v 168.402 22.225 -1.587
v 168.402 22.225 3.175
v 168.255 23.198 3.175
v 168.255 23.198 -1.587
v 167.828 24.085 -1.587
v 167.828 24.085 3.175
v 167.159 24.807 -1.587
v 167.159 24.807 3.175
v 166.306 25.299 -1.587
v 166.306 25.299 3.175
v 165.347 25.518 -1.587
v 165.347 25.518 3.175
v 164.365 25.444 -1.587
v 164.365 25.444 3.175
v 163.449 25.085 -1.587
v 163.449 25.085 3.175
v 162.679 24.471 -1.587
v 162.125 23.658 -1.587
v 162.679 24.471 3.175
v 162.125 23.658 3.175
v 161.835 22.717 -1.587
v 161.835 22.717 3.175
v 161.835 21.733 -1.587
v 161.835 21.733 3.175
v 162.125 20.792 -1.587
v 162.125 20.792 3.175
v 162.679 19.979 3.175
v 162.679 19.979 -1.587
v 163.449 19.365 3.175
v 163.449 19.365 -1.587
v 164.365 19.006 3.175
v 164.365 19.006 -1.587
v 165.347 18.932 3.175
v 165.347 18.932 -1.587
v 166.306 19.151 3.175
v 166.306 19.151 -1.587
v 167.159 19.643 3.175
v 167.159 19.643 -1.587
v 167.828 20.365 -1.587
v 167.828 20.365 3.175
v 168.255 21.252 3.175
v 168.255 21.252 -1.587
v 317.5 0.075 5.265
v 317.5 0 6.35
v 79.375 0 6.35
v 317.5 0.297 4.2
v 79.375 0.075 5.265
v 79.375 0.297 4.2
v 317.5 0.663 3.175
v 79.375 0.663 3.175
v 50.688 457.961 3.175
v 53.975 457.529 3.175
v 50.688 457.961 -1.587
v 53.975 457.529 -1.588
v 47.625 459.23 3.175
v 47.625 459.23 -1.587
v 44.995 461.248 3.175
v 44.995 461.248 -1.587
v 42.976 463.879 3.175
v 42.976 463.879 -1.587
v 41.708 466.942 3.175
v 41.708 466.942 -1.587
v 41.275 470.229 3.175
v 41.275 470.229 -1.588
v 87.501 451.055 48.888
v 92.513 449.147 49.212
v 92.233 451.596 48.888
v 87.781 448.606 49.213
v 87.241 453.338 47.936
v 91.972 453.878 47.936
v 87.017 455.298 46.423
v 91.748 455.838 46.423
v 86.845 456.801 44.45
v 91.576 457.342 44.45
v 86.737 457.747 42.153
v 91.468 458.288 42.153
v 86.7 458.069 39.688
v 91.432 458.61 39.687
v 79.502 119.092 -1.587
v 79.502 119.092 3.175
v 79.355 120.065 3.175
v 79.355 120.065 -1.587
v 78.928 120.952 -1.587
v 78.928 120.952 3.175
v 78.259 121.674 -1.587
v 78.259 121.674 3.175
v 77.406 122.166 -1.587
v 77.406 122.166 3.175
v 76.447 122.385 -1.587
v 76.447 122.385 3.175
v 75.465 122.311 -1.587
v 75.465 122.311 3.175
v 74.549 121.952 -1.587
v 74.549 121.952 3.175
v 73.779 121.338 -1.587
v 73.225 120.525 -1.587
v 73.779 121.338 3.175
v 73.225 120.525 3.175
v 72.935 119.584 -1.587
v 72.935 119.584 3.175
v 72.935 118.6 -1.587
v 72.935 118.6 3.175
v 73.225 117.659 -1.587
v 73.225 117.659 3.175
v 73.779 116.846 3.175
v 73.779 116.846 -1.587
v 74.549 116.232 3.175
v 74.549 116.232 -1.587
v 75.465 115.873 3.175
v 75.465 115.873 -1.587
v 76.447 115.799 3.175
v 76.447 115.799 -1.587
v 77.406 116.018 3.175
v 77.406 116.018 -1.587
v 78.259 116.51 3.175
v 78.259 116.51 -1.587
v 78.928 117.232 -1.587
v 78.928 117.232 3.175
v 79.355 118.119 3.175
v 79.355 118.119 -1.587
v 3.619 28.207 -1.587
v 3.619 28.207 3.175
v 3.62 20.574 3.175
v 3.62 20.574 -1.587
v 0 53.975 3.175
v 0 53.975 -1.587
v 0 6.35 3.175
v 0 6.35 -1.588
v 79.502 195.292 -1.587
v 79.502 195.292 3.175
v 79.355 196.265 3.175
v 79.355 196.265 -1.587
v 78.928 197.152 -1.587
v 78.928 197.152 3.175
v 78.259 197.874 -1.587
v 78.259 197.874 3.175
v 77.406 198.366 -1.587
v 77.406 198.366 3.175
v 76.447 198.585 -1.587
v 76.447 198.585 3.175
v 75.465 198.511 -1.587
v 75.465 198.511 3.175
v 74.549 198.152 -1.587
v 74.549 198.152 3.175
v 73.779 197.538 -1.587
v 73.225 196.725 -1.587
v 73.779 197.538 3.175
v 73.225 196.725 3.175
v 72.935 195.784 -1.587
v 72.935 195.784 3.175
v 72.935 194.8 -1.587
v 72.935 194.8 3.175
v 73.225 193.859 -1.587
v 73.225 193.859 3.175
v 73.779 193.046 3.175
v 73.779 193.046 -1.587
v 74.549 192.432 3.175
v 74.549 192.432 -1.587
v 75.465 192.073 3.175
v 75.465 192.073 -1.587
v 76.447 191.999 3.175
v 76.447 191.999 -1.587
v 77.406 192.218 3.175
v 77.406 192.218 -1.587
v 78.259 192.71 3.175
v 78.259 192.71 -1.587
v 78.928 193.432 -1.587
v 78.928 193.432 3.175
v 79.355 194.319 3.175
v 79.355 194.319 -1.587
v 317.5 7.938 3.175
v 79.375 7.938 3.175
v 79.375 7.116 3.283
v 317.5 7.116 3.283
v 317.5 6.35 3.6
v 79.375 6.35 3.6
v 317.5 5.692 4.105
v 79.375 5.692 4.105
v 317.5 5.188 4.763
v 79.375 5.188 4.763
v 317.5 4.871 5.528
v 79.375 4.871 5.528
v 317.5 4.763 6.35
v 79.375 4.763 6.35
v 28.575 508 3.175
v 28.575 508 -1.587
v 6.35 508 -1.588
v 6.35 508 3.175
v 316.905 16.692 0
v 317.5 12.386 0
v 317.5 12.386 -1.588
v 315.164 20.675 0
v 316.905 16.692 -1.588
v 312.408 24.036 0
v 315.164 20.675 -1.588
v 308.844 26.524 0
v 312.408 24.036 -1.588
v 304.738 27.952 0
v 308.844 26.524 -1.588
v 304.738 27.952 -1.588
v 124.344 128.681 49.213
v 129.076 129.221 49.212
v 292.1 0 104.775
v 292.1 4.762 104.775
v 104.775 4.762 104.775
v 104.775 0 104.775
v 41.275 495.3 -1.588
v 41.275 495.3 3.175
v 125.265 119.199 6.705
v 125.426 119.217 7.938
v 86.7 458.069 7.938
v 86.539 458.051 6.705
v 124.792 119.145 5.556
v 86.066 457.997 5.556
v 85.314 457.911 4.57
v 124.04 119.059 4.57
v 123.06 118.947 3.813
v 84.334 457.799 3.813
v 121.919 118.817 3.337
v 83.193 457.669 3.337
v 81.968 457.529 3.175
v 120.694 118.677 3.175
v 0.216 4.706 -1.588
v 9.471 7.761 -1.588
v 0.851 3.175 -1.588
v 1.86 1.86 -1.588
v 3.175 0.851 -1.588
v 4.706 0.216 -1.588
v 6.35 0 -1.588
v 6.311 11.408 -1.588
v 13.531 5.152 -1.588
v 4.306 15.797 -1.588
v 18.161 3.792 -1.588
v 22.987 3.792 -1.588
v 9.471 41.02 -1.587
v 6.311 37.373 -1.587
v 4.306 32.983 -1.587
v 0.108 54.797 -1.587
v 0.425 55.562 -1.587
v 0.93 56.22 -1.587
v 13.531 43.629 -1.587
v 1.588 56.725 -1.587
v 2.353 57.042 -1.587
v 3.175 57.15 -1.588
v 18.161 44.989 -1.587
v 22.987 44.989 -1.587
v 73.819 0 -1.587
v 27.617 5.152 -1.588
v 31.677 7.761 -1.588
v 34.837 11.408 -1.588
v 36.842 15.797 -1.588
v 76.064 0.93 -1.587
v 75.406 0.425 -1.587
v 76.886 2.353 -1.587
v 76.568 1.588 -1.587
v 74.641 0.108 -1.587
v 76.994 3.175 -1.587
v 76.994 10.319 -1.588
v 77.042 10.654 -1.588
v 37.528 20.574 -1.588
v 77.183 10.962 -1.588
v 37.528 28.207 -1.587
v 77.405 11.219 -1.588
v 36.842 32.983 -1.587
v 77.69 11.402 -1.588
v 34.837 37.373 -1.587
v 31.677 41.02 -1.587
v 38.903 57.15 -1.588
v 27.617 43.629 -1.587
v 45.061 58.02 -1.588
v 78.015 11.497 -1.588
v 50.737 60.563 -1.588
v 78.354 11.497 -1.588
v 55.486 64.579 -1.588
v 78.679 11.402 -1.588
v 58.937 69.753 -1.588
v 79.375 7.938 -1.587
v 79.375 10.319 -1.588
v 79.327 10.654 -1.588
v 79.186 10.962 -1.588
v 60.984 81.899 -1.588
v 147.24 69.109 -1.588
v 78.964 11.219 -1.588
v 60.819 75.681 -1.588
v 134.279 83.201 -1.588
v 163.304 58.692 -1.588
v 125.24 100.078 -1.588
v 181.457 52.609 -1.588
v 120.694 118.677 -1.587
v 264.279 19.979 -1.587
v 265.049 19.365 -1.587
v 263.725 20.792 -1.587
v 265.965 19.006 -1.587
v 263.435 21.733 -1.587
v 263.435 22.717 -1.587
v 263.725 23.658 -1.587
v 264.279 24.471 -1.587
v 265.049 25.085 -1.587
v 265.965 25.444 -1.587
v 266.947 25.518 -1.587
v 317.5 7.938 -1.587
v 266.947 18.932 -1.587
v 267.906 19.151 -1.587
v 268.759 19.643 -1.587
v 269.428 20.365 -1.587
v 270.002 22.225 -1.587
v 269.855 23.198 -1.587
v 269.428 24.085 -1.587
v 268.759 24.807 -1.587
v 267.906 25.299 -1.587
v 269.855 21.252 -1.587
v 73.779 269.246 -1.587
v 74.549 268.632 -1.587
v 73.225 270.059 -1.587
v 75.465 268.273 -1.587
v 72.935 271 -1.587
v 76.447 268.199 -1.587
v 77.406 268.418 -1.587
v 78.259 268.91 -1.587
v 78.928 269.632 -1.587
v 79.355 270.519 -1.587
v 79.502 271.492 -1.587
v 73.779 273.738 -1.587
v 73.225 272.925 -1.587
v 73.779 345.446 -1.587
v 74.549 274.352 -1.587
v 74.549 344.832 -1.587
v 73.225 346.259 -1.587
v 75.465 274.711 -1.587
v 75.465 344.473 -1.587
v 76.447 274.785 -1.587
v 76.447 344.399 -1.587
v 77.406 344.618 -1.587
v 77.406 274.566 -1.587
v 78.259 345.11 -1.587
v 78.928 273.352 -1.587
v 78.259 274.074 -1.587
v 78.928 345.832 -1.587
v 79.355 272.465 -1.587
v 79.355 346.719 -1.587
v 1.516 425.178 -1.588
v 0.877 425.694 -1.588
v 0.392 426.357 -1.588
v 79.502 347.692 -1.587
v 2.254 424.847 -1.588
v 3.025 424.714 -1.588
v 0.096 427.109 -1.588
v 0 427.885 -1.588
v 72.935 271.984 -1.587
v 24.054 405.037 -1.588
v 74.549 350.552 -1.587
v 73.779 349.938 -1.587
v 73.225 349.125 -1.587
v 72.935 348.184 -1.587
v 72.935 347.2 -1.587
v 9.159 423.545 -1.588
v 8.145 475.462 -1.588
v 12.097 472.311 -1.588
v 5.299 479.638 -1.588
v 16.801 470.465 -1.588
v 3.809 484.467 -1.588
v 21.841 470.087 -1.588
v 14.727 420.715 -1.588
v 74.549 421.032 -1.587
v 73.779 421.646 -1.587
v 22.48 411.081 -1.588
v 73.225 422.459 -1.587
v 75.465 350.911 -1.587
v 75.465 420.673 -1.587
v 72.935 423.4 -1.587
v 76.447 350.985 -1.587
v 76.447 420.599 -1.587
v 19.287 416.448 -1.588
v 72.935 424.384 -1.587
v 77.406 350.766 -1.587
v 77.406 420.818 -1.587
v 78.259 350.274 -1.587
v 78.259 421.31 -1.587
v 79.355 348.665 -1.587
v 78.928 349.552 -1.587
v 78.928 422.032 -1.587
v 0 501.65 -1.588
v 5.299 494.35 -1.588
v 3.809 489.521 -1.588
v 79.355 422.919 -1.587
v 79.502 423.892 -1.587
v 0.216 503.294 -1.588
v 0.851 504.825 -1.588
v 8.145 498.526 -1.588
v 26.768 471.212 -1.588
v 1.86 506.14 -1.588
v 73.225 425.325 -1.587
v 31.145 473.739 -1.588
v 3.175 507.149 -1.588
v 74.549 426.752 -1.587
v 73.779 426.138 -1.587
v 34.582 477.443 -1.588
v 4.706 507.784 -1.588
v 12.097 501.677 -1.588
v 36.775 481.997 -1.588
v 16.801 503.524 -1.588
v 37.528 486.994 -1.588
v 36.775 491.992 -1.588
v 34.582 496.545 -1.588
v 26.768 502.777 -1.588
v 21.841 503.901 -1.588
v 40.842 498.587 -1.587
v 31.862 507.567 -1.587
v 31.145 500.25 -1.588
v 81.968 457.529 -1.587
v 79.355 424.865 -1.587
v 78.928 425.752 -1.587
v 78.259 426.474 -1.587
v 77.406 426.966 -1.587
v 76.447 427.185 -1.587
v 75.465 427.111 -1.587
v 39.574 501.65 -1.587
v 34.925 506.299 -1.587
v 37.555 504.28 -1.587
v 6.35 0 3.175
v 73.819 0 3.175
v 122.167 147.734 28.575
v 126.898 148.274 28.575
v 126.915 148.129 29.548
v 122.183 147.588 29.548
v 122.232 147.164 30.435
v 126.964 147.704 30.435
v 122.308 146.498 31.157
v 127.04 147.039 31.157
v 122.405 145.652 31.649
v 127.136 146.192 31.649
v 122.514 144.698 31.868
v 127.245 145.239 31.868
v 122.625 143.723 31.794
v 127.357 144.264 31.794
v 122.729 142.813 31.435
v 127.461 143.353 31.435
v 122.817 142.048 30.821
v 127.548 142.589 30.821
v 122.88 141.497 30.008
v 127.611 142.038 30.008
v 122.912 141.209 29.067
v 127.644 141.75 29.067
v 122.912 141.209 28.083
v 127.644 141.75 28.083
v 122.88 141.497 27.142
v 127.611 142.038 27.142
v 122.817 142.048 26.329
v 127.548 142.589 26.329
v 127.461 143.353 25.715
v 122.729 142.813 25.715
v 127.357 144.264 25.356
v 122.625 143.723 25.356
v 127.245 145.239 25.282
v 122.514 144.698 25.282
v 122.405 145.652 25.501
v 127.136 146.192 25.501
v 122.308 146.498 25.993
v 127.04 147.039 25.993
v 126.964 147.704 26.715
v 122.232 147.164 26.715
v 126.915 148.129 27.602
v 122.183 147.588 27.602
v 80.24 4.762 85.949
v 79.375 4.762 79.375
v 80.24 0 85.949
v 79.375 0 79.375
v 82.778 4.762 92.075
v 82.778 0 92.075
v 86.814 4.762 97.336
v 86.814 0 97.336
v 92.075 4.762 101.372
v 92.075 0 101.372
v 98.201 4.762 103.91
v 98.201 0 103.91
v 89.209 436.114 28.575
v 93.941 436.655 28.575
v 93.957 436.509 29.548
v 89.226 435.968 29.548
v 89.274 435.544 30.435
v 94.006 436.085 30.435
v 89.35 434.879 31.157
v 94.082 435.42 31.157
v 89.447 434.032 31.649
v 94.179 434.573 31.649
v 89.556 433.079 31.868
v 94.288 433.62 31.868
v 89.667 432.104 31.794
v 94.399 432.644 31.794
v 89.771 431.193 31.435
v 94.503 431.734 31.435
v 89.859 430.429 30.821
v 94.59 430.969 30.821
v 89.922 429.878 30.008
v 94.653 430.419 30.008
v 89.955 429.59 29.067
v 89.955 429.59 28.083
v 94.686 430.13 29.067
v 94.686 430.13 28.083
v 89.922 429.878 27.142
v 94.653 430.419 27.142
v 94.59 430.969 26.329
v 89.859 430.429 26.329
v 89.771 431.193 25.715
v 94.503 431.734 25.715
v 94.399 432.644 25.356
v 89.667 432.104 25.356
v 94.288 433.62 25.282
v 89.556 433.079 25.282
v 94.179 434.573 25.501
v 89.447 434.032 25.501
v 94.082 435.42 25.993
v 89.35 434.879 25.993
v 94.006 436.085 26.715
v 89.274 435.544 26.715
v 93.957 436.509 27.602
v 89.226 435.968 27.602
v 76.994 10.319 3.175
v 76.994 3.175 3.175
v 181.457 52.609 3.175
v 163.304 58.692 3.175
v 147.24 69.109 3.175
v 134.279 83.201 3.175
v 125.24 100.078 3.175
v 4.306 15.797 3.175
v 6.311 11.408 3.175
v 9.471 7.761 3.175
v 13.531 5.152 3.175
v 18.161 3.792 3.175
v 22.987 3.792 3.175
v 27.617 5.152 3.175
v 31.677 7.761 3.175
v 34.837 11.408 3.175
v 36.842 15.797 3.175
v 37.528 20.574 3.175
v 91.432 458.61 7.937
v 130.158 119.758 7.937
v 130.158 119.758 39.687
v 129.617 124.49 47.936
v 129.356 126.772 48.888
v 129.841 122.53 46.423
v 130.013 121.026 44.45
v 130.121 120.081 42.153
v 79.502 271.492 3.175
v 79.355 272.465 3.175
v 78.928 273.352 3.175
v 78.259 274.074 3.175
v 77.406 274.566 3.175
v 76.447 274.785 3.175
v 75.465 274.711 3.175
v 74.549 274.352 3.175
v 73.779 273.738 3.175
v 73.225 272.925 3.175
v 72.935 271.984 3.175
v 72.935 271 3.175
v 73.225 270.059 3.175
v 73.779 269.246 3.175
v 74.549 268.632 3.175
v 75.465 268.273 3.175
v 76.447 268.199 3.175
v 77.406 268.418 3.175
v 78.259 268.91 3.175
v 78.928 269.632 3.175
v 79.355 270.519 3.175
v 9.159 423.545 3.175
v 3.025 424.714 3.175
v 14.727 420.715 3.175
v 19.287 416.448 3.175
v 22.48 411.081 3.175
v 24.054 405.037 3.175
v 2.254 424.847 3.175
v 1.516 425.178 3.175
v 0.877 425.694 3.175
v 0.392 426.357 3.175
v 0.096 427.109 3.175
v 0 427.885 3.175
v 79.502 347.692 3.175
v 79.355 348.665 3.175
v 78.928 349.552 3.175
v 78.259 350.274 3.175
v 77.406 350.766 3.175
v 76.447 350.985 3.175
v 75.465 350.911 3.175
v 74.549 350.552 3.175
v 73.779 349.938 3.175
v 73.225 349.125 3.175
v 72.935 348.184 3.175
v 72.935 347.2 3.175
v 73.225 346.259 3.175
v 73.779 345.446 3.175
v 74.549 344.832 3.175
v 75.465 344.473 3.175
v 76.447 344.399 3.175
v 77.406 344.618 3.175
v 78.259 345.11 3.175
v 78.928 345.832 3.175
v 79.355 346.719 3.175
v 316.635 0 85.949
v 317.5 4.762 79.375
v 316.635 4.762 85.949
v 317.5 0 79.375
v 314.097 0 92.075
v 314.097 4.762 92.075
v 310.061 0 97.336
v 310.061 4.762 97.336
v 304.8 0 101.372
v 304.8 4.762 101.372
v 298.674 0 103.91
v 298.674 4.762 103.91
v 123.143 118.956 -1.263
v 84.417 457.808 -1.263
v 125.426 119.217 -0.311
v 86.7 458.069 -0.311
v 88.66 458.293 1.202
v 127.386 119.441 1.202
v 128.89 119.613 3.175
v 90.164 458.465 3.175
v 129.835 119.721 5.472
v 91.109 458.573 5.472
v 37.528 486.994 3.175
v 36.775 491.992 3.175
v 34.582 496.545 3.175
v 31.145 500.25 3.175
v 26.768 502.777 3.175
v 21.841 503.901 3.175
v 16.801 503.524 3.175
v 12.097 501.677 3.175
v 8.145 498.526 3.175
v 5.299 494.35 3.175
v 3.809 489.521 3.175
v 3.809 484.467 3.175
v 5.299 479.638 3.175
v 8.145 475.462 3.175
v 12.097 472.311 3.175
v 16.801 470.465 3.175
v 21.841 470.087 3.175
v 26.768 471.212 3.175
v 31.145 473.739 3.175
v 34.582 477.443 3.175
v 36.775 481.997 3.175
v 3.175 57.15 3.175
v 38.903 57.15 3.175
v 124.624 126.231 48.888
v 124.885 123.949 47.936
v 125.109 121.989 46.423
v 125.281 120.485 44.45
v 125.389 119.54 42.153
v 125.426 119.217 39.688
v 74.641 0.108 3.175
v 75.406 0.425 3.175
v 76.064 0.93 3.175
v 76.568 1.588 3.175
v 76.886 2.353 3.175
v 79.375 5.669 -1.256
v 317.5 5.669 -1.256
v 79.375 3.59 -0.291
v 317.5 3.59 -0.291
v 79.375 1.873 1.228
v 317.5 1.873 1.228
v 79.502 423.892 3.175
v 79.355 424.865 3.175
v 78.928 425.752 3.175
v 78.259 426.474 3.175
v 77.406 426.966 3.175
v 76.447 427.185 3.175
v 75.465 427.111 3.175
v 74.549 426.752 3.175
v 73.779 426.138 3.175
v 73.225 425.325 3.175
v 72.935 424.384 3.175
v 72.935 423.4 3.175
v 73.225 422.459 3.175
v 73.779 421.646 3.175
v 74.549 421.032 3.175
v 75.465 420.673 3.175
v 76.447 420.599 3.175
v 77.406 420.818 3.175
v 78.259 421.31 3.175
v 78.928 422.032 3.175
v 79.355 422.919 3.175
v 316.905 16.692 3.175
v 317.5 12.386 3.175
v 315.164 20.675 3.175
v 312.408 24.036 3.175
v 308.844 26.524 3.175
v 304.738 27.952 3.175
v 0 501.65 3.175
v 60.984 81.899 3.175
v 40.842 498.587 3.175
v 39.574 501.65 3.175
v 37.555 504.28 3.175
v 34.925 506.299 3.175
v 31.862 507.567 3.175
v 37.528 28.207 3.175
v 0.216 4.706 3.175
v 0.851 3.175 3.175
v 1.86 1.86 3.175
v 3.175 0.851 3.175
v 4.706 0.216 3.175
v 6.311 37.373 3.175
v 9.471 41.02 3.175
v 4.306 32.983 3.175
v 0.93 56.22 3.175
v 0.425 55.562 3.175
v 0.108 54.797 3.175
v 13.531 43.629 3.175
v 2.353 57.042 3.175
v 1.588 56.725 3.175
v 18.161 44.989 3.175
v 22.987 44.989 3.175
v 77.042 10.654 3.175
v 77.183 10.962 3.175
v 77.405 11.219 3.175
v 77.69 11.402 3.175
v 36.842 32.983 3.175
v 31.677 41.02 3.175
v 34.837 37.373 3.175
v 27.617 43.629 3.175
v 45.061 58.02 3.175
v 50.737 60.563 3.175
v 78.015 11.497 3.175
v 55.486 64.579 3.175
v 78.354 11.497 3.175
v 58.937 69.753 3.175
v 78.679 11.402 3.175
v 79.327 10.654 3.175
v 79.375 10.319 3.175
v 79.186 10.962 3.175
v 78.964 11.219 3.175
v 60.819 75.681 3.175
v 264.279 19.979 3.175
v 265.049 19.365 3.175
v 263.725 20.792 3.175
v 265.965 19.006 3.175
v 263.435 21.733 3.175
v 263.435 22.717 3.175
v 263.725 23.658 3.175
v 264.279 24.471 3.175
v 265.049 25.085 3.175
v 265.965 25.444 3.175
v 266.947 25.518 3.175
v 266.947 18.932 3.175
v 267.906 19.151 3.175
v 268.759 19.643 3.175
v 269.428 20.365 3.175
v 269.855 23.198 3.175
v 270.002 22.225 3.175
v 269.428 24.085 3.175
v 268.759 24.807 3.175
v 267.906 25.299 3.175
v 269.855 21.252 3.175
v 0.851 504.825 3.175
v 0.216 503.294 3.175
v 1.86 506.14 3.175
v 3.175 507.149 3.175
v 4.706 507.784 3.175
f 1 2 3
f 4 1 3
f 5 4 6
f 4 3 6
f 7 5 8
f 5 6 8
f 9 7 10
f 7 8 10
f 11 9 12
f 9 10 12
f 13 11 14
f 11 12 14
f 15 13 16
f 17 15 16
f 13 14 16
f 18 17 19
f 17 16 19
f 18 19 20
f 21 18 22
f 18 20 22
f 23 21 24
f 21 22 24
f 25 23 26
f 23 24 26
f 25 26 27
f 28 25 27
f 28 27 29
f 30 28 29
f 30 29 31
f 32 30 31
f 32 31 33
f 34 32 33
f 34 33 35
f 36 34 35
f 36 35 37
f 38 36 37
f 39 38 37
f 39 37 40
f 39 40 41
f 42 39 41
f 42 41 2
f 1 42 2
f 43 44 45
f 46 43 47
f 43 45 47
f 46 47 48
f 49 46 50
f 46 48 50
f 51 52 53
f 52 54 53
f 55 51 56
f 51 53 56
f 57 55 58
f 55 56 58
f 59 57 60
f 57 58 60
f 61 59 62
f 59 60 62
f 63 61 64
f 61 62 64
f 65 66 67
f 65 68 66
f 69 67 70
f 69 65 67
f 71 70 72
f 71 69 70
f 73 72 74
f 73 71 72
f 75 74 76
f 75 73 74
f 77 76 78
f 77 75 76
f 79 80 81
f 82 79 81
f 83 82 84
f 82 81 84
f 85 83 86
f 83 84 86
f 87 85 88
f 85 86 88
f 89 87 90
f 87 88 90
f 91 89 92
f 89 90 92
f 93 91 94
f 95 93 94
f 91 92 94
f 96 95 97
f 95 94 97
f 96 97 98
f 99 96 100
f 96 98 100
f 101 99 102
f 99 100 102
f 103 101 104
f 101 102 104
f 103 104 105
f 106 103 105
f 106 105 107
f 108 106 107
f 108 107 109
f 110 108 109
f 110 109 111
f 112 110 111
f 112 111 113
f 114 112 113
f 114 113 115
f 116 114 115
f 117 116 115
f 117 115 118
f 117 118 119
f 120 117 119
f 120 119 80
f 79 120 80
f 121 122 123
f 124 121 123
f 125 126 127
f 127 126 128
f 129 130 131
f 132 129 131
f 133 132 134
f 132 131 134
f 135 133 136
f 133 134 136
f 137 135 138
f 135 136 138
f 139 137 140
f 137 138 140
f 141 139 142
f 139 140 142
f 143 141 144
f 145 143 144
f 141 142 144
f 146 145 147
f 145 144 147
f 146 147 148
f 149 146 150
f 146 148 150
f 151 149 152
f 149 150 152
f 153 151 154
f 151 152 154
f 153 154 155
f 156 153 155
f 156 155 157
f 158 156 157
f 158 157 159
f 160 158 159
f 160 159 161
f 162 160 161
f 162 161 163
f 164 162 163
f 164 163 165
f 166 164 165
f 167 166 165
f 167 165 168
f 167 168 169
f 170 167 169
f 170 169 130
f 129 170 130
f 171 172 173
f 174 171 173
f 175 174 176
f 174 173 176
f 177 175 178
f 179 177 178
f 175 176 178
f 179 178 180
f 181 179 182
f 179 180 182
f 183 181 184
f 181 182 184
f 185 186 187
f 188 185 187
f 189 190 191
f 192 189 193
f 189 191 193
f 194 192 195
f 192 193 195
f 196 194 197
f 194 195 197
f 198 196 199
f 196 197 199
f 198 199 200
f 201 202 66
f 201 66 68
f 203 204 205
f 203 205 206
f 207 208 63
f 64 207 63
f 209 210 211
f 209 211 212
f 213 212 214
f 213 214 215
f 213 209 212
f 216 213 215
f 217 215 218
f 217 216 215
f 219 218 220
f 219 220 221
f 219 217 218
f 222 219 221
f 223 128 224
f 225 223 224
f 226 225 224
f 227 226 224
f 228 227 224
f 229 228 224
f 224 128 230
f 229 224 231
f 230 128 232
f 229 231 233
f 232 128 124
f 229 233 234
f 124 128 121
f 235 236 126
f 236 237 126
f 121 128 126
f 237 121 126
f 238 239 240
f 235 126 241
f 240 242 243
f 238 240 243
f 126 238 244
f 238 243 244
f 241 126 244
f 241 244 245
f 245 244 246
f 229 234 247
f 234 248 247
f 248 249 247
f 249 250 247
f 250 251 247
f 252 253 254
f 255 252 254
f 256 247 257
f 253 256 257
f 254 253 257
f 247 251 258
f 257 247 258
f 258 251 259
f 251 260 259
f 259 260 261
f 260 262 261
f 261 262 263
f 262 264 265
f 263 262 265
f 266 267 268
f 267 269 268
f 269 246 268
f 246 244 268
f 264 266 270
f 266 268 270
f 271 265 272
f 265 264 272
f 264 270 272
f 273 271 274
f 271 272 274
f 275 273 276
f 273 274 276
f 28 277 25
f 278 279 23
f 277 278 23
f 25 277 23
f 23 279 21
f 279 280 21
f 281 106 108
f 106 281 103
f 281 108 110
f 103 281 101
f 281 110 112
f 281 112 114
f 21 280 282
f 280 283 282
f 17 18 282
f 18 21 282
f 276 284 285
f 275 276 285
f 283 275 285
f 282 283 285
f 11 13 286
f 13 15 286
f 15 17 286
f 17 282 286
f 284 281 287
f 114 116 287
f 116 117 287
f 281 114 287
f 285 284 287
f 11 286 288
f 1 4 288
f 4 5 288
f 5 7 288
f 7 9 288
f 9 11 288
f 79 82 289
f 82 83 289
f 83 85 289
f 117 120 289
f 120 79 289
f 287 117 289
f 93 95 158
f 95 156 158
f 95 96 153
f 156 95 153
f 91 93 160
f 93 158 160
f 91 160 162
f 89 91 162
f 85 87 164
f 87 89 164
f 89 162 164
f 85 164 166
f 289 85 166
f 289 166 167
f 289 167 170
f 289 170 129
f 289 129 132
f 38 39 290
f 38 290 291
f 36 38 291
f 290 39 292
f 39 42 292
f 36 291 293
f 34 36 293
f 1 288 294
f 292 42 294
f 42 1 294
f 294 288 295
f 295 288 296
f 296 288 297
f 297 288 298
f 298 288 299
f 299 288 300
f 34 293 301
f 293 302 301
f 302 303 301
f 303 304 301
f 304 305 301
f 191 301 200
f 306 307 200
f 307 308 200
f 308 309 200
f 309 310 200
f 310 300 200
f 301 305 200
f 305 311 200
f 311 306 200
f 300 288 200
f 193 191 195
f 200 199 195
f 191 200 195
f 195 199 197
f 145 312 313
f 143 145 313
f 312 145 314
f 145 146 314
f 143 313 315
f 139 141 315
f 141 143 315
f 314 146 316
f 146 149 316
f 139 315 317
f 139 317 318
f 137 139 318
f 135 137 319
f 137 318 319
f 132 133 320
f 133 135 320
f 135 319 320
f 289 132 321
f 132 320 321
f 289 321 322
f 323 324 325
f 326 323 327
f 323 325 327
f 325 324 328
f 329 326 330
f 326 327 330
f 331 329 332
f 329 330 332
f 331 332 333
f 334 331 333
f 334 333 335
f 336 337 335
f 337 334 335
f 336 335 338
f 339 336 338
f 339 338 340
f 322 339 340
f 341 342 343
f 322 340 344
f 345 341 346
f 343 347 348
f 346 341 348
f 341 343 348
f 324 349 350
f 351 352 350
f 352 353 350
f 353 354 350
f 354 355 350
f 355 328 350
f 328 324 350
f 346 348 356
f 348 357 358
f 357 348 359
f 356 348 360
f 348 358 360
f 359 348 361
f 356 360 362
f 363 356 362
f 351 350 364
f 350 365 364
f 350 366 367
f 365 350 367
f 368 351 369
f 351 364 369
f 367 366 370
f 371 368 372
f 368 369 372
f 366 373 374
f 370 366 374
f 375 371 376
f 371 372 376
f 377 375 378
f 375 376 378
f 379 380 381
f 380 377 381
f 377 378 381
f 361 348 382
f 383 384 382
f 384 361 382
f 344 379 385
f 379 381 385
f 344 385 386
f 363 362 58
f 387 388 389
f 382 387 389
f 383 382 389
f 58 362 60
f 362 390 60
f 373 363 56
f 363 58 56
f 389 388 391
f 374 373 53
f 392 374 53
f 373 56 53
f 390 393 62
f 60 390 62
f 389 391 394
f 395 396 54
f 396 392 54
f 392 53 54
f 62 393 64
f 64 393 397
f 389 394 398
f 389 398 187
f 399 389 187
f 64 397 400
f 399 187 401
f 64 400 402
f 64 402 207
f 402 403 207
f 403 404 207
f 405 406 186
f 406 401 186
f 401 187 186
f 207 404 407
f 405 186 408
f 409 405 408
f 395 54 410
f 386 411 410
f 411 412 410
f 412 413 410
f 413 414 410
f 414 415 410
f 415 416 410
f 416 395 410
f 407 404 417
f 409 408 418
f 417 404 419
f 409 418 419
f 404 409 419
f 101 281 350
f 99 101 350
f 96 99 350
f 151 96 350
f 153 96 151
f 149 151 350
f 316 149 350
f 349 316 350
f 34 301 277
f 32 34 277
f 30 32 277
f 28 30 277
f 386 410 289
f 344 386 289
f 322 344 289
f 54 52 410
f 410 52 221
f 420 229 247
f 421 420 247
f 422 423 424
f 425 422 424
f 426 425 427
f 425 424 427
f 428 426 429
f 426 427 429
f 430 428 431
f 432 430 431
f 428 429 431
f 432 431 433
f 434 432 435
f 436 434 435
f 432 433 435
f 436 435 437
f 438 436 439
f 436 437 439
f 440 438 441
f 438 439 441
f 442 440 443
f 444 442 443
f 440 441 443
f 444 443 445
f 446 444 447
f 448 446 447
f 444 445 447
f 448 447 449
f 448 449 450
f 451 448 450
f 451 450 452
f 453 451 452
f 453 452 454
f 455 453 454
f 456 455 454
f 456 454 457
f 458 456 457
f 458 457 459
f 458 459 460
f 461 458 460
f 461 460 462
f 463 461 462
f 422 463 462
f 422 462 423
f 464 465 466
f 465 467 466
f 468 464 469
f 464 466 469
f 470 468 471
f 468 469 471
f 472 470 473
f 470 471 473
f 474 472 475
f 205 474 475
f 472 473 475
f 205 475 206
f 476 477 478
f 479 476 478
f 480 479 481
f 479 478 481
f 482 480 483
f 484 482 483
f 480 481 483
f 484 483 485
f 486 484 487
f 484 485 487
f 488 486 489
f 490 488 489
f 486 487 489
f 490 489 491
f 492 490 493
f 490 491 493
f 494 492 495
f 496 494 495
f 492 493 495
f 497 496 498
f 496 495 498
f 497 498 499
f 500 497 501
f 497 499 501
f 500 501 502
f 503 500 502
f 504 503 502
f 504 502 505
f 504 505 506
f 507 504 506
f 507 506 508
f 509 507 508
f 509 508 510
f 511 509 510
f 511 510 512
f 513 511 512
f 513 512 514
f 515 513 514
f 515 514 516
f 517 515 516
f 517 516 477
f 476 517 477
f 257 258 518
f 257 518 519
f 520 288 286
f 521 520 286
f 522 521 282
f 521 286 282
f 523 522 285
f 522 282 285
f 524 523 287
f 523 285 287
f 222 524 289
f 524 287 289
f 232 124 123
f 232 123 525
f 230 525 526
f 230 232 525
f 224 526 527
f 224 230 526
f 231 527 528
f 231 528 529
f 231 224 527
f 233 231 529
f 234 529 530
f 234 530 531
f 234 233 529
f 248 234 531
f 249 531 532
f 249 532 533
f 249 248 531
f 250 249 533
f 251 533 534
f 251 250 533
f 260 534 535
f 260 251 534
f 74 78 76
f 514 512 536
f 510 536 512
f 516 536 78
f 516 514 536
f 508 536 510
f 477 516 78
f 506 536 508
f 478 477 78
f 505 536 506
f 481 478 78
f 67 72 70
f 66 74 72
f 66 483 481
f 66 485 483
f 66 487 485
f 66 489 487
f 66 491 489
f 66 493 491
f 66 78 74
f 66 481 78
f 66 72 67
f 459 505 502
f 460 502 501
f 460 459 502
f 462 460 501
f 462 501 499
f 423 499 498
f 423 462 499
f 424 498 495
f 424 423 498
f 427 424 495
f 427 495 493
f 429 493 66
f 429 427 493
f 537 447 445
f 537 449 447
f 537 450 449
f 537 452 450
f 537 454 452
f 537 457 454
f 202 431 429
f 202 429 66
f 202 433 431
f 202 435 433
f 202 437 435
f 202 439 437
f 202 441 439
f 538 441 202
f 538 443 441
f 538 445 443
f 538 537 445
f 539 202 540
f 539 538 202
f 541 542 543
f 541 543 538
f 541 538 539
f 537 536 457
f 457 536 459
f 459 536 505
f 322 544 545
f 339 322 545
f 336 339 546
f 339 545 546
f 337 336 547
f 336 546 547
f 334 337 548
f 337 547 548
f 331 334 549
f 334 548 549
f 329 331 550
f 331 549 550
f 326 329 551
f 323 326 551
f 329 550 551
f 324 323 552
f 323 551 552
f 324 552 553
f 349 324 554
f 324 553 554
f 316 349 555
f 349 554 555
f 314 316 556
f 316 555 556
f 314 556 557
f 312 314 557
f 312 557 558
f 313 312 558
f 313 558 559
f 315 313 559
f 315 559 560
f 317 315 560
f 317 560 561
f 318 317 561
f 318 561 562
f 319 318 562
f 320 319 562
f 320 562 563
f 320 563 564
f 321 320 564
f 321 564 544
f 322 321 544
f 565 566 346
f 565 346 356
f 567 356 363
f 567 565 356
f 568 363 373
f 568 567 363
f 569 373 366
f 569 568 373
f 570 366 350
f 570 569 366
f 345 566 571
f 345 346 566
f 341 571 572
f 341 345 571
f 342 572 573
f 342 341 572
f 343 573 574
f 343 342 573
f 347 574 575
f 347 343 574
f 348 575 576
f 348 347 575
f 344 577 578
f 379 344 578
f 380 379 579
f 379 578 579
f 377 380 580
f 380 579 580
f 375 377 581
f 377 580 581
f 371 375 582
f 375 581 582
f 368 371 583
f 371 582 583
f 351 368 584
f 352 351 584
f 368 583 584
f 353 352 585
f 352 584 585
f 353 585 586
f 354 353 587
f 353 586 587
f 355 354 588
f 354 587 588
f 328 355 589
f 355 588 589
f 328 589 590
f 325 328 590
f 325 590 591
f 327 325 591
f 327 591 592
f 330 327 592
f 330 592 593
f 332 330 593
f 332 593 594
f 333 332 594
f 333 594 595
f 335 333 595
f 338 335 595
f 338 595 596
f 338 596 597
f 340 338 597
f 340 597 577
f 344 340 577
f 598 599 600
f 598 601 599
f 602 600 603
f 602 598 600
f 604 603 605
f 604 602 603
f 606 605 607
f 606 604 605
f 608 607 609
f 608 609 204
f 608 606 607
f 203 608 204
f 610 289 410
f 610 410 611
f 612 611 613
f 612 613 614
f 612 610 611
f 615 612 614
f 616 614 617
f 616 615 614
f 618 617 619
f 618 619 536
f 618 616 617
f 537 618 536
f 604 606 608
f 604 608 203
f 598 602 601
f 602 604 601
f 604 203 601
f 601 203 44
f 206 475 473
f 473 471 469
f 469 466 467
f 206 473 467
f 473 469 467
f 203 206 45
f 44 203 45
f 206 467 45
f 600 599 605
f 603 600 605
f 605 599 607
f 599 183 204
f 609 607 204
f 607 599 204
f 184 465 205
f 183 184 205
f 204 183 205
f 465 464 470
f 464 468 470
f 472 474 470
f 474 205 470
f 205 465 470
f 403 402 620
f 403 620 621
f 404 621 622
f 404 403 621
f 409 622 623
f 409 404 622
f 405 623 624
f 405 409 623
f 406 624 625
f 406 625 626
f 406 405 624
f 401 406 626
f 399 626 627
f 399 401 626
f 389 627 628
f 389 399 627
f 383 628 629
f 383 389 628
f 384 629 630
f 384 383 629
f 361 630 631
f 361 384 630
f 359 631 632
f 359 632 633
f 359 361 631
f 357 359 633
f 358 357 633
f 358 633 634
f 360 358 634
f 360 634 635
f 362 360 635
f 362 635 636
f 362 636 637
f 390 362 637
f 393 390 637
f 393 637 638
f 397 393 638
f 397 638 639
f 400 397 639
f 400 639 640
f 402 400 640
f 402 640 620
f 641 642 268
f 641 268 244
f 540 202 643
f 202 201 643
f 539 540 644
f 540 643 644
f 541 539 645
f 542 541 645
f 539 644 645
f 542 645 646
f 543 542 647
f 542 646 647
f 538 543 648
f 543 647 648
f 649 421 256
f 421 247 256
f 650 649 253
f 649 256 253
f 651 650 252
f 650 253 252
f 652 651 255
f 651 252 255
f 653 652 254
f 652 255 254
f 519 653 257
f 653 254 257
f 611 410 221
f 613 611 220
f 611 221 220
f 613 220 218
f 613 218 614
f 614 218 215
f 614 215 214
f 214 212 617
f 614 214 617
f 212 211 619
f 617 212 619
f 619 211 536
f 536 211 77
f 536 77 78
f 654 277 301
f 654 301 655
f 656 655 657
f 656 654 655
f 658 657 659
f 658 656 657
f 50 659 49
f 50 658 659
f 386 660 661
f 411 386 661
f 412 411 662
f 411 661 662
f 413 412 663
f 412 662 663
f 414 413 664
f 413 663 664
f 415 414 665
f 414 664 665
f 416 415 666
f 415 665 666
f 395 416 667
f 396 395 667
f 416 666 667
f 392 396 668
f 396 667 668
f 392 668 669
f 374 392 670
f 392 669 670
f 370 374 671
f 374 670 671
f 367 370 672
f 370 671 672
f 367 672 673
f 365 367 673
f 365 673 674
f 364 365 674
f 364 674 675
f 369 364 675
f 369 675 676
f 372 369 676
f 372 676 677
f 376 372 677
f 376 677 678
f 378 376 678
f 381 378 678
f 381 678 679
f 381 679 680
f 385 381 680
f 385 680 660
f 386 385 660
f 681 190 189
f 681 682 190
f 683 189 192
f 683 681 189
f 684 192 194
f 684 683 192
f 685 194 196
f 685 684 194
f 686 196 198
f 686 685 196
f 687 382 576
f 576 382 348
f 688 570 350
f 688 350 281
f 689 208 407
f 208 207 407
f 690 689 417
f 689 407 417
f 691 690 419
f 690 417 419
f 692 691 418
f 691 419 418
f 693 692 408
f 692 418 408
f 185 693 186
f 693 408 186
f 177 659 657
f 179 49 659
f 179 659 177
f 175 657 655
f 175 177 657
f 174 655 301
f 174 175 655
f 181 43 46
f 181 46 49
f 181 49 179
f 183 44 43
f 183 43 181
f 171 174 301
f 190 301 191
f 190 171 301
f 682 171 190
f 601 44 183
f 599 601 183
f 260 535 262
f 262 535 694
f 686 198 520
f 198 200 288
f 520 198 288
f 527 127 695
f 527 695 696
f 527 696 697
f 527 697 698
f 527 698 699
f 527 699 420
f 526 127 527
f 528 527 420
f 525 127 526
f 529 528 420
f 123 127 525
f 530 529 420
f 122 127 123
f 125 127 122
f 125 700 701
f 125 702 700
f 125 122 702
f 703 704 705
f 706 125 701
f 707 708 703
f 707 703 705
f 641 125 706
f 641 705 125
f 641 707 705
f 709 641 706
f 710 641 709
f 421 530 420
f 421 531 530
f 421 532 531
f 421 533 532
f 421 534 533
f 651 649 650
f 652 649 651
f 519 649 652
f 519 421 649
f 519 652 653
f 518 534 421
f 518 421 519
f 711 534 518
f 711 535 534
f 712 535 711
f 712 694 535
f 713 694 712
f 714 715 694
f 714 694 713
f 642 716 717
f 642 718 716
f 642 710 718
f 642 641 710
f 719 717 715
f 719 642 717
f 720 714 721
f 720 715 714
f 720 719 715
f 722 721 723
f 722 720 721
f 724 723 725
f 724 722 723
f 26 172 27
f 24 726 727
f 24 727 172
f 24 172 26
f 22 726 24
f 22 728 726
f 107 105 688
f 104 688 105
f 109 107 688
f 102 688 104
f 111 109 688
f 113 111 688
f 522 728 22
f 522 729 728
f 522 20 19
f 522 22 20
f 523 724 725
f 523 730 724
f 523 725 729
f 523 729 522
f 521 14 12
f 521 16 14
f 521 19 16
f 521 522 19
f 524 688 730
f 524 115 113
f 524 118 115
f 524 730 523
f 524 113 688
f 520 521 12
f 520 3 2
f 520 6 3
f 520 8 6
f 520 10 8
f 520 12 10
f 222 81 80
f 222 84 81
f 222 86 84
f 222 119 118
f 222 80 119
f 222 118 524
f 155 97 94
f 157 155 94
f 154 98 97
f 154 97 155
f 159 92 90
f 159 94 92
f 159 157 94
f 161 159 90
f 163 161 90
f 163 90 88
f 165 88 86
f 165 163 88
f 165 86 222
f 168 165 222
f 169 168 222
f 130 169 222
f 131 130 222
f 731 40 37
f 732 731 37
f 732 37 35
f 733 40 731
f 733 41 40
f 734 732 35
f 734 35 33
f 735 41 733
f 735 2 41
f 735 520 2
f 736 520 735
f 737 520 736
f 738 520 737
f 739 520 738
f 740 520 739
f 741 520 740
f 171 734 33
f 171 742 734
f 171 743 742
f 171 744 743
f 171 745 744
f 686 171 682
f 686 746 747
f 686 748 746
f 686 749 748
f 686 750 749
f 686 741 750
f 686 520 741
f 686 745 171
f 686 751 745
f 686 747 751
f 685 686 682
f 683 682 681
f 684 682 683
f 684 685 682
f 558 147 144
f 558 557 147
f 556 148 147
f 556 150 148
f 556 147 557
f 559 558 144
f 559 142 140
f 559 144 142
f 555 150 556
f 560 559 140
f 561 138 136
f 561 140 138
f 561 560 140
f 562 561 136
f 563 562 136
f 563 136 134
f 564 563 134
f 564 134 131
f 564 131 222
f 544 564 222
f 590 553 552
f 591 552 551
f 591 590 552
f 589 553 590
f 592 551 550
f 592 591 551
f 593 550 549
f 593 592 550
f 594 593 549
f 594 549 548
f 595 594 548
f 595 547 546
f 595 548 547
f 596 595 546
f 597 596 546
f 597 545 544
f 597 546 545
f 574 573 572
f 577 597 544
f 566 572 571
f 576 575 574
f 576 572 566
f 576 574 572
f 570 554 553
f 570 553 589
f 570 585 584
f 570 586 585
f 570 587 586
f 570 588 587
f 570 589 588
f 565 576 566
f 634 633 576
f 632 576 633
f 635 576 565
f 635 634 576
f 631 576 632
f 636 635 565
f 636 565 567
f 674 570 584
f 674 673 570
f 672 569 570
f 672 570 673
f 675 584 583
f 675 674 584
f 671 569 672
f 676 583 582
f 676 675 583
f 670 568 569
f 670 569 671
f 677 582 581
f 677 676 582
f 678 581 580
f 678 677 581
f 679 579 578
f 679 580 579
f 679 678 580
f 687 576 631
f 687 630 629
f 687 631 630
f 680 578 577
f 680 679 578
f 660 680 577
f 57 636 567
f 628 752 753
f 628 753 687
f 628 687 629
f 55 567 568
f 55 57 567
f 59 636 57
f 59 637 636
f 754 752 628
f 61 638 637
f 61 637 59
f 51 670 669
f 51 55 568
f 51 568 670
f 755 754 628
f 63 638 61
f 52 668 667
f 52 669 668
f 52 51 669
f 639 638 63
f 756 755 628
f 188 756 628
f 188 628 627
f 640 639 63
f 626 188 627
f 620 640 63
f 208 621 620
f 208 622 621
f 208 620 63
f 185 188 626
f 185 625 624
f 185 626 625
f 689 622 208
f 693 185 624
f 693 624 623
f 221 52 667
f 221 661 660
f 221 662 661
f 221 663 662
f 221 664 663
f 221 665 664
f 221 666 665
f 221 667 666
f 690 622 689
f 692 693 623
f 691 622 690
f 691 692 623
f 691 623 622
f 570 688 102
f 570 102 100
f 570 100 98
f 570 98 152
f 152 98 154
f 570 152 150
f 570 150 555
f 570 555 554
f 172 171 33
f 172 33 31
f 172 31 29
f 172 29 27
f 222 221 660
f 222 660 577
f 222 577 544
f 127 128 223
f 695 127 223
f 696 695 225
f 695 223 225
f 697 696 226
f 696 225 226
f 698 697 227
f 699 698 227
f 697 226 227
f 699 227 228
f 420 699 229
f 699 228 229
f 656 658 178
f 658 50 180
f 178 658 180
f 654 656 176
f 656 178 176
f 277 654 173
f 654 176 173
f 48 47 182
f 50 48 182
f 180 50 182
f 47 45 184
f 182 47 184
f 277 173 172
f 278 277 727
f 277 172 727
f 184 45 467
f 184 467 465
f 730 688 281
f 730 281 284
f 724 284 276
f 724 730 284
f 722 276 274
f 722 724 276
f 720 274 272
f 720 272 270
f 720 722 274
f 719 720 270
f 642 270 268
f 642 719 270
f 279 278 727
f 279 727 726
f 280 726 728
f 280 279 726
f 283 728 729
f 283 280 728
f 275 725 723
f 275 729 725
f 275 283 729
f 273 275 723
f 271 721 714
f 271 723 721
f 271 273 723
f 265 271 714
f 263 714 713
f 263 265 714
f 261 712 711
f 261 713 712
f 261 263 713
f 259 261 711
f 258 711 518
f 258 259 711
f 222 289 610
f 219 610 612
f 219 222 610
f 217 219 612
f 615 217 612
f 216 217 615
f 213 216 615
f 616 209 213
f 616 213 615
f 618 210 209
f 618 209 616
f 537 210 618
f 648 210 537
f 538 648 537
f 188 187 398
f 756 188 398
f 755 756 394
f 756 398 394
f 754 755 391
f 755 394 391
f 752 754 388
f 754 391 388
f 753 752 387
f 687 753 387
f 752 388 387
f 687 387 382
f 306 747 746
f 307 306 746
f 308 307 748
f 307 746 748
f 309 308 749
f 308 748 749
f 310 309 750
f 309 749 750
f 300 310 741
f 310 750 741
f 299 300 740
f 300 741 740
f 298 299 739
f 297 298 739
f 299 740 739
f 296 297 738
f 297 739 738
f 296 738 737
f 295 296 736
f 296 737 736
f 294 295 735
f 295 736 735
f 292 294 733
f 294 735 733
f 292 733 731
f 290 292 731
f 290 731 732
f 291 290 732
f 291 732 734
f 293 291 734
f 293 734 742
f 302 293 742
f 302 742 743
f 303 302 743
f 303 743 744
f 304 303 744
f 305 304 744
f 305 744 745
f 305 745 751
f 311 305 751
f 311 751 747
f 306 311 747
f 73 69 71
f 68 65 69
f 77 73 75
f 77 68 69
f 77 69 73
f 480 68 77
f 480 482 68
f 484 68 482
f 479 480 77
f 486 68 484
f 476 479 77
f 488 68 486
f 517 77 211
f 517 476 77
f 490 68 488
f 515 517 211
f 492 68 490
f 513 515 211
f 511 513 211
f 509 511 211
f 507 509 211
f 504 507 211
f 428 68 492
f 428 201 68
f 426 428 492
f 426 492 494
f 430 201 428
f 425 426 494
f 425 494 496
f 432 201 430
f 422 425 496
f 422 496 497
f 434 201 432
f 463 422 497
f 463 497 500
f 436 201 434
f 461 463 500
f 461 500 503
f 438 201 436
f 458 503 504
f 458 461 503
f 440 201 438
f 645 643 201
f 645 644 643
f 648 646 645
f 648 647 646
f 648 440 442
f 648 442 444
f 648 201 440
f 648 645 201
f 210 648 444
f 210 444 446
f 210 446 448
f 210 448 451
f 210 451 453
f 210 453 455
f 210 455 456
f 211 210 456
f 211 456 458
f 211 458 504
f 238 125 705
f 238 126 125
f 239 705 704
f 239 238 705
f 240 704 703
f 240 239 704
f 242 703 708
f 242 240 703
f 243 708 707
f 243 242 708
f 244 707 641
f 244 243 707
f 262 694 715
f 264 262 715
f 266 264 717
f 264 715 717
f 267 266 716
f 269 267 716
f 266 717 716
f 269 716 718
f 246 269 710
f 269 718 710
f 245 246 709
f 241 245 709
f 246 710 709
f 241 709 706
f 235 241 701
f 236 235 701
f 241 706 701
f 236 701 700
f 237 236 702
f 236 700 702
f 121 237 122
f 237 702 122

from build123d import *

# Parameters (mm, degrees)
BOSS_EXTRUDE1_DEPTH      = 3.175
SKETCH2_R                = 16.9545
CUT_EXTRUDE1_DEPTH       = 600.06621556
FILLET1_R                = 15.875
CONVERT_SOLID1_START     = -1.5875
CONVERT_SOLID1_OUTLINE_R = 16.9545
CONVERT_SOLID1_DEPTH     = 1.5875
EDGE_FLANGE1_START       = 76.99375
EDGE_FLANGE1_DEPTH       = 240.50625
EDGE_FLANGE1_START_2     = 79.375
EDGE_FLANGE1_2_DEPTH     = 238.125
EDGE_FLANGE1_START_3     = -3
EDGE_FLANGE1_3_DEPTH     = 9.35
FILLET2_R                = 25.4
FILLET3_R                = 3.175
CUT_EXTRUDE2_DEPTH       = 4.7625
FILLET4_R                = 3.175
EDGE_FLANGE3_DEPTH       = 341.057724741
FILLET5_R                = 9.525
CUT_EXTRUDE3_DEPTH       = 4.7625
FILLET7_R                = 12.7
SKETCH17_R               = 3.302
CUT_EXTRUDE4_DEPTH       = 608.612384802
CUT_EXTRUDE5_DEPTH       = 608.612384802
SKETCH19_R               = 3.302
CUT_EXTRUDE6_DEPTH       = 533.561746786


with BuildPart() as part:
    # Sketch1 → Boss-Extrude1 (new body)
    with BuildSketch(Plane.XY):
        with BuildLine():
            Line((6.35, 0), (317.5, 0))
            Line((317.5, 0), (317.5, 25.4))
            Line((317.5, 25.4), (181.457249023, 52.608550195))
            ThreePointArc((181.457249023, 52.608550195), (140.315142877, 75.746018143), (120.694108864, 118.676547437))
            Line((120.694108864, 118.676547437), (76.2, 508))
            Line((76.2, 508), (6.35, 508))
            ThreePointArc((6.35, 508), (1.859871939, 506.140128061), (0, 501.65))
            Line((0, 501.65), (0, 6.35))
            ThreePointArc((0, 6.35), (1.859871939, 1.859871939), (6.35, 0))
        make_face()
    extrude(amount=BOSS_EXTRUDE1_DEPTH)

    # Sketch2 → Cut-Extrude1 (cut, through all)
    with BuildSketch(Plane.XY.offset(3.175)):
        with Locations((20.574, 486.9942)):
            Circle(SKETCH2_R)
        with Locations((20.574, 20.574)):
            Circle(SKETCH2_R)
    extrude(amount=-CUT_EXTRUDE1_DEPTH, mode=Mode.SUBTRACT)

    # Fillet1
    fillet1_edges = [part.edges().sort_by_distance(p)[0] for p in [
        (317.5, 25.4, 1.5875),
    ]]
    fillet(fillet1_edges, radius=FILLET1_R)

    # Convert-Solid1: read off the stored shape, not the designer's step
    # Convert-Solid1 outline → Convert-Solid1 (add)
    with BuildSketch(Plane.XY.offset(CONVERT_SOLID1_START)):
        with BuildLine():
            Line((304.738343645, 27.952331271), (181.457249023, 52.608550195))
            ThreePointArc((181.457249023, 52.608550195), (140.315142877, 75.746018143), (120.694108864, 118.676547437))
            Line((120.694108864, 118.676547437), (76.2, 508))
            Line((76.2, 508), (6.35, 508))
            ThreePointArc((6.35, 508), (1.859871939, 506.140128061), (0, 501.65))
            Line((0, 501.65), (0, 6.35))
            ThreePointArc((0, 6.35), (1.859871939, 1.859871939), (6.35, 0))
            Line((6.35, 0), (317.5, 0))
            Line((317.5, 0), (317.5, 12.385613044))
            ThreePointArc((317.5, 12.385613044), (313.901806494, 22.450186921), (304.738343645, 27.952331271))
        make_face()
        with Locations((20.574, 20.574)):
            Circle(CONVERT_SOLID1_OUTLINE_R, mode=Mode.SUBTRACT)
        with Locations((20.574, 486.9942)):
            Circle(CONVERT_SOLID1_OUTLINE_R, mode=Mode.SUBTRACT)
    extrude(amount=CONVERT_SOLID1_DEPTH)

    # Edge-Flange1: read off the stored shape, not the designer's step
    # Edge-Flange1 outline → Edge-Flange1 (cut)
    with BuildSketch(Plane.YZ.offset(EDGE_FLANGE1_START)):
        with BuildLine():
            ThreePointArc((7.9375, -1.5875), (3.589952199, -0.290988961), (0.662661084, 3.175))
            Line((0.662661084, 3.175), (0, 3.175))
            Line((0, 3.175), (0, -1.5875))
            Line((0, -1.5875), (7.9375, -1.5875))
        make_face()
    extrude(amount=EDGE_FLANGE1_DEPTH, mode=Mode.SUBTRACT)

    # Edge-Flange1 2 outline → Edge-Flange1 2 (add)
    with BuildSketch(Plane.YZ.offset(EDGE_FLANGE1_START_2)):
        with BuildLine():
            Line((0, 104.775), (0, 6.35))
            ThreePointArc((0, 6.35), (0.167431141, 4.728292203), (0.662661084, 3.175))
            Line((0.662661084, 3.175), (7.9375, 3.175))
            ThreePointArc((7.9375, 3.175), (5.69243597, 4.10493597), (4.7625, 6.35))
            Line((4.7625, 6.35), (4.7625, 104.775))
            Line((4.7625, 104.775), (0, 104.775))
        make_face()
    extrude(amount=EDGE_FLANGE1_2_DEPTH)

    # Edge-Flange1 3 outline → Edge-Flange1 3 (cut)
    with BuildSketch(Plane.XY.offset(EDGE_FLANGE1_START_3)):
        with BuildLine():
            Line((79.375, -1), (79.375, 10.31875))
            ThreePointArc((79.375, 10.31875), (78.184375, 11.509375), (76.99375, 10.31875))
            Line((76.99375, 10.31875), (76.99375, -1))
            Line((76.99375, -1), (79.375, -1))
        make_face()
    extrude(amount=EDGE_FLANGE1_3_DEPTH, mode=Mode.SUBTRACT)

    # Fillet2
    fillet2_edges = [part.edges().sort_by_distance(p)[0] for p in [
        (79.375, 2.38125, 104.775),
        (317.5, 2.38125, 104.775),
    ]]
    fillet(fillet2_edges, radius=FILLET2_R)

    # Fillet3
    fillet3_edges = [part.edges().sort_by_distance(p)[0] for p in [
        (76.99375, 0, 0.79375),
    ]]
    fillet(fillet3_edges, radius=FILLET3_R)

    # Sketch7 → Cut-Extrude2 (cut)
    with BuildSketch(Plane.XY.offset(3.175)):
        with BuildLine():
            Line((24.053808826, 405.037372989), (60.983957397, 81.898572989))
            ThreePointArc((60.983957397, 81.898572989), (55.486376009, 64.57864546), (38.902693748, 57.15))
            Line((38.902693748, 57.15), (0, 57.15))
            Line((0, 57.15), (0, 424.7388))
            Line((0, 424.7388), (1.972545176, 424.7388))
            ThreePointArc((1.972545176, 424.7388), (16.768899716, 419.097482261), (24.053808826, 405.037372989))
        make_face()
    extrude(amount=-CUT_EXTRUDE2_DEPTH, mode=Mode.SUBTRACT)

    # Fillet4
    fillet4_edges = [part.edges().sort_by_distance(p)[0] for p in [
        (0, 424.7388, 0.79375),
        (0, 57.15, 0.79375),
    ]]
    fillet(fillet4_edges, radius=FILLET4_R)

    # Edge-Flange3: sheet metal written as solids
    # Edge-Flange3 section (on a plane across the edge) → Edge-Flange3 (add)
    with BuildSketch(Plane(origin=(125.425808218, 119.217313077, 3.175), x_dir=(-0.9935326726564042, -0.11354659116073179, 3.4914813388431334e-15), z_dir=(-0.11354659116073179, 0.9935326726564042, 0))):
        with BuildLine():
            Line((-4.7625, 4.7625), (-4.7625, 46.0375))
            Line((-4.7625, 46.0375), (0, 46.0375))
            Line((0, 46.0375), (0, 4.7625))
            ThreePointArc((0, 4.7625), (1.394903955, 1.394903955), (4.7625, 0))
            Line((4.7625, 0), (4.7625, -4.7625))
            ThreePointArc((4.7625, -4.7625), (-1.972692091, -1.972692091), (-4.7625, 4.7625))
        make_face()
    extrude(amount=EDGE_FLANGE3_DEPTH)

    # Fillet5
    fillet5_edges = [part.edges().sort_by_distance(p)[0] for p in [
        (127.791657895, 119.487695897, 49.2125),
        (89.065715861, 458.33968869, 49.2125),
    ]]
    fillet(fillet5_edges, radius=FILLET5_R)

    # Sketch16 → Cut-Extrude3 (cut)
    with BuildSketch(Plane.XY.offset(3.175)):
        Polygon((76.2, 508), (41.275, 508), (41.275, 457.528540229), (81.968166831, 457.528540229), align=None)
    extrude(amount=-CUT_EXTRUDE3_DEPTH, mode=Mode.SUBTRACT)

    # Fillet7
    fillet7_edges = [part.edges().sort_by_distance(p)[0] for p in [
        (41.275, 457.528540229, 0.79375),
        (41.275, 508, 0.79375),
    ]]
    fillet(fillet7_edges, radius=FILLET7_R)

    # Sketch17 → Cut-Extrude4 (cut, through all)
    with BuildSketch(Plane.XY.offset(3.175)):
        with Locations((76.2, 423.892006342)):
            Circle(SKETCH17_R)
        with Locations((76.2, 347.692006342)):
            Circle(SKETCH17_R)
        with Locations((76.2, 271.492006342)):
            Circle(SKETCH17_R)
        with Locations((76.2, 195.292006342)):
            Circle(SKETCH17_R)
        with Locations((76.2, 119.092006342)):
            Circle(SKETCH17_R)
        with Locations((266.7, 22.225)):
            Circle(SKETCH17_R)
        with Locations((165.1, 22.225)):
            Circle(SKETCH17_R)
    extrude(amount=-CUT_EXTRUDE4_DEPTH, mode=Mode.SUBTRACT)

    # Sketch18 → Cut-Extrude5 (cut, through all)
    with BuildSketch(Plane.XY.offset(3.175)):
        with BuildLine():
            Line((3.6195, 28.2067), (3.6195, 20.574))
            ThreePointArc((3.6195, 20.574), (20.574, 3.6195), (37.5285, 20.574))
            Line((37.5285, 20.574), (37.5285, 28.2067))
            ThreePointArc((37.5285, 28.2067), (20.574, 45.1612), (3.6195, 28.2067))
        make_face()
    extrude(amount=-CUT_EXTRUDE5_DEPTH, mode=Mode.SUBTRACT)

    # Sketch19 → Cut-Extrude6 (cut, through all)
    with BuildSketch(Plane(origin=(141.989587265, 16.227381402, 0), x_dir=(0, 0, -1), z_dir=(0.9935326726564043, 0.1135465911607318, -3.62817709114321e-15))):
        with Locations(Location((-28.575, 419.862347463, 0), (0, 0, 90))):
            Circle(SKETCH19_R)
        with Locations(Location((-28.575, 129.604622722, 0), (0, 0, 90))):
            Circle(SKETCH19_R)
    extrude(amount=-CUT_EXTRUDE6_DEPTH, mode=Mode.SUBTRACT)


solid = part.part
